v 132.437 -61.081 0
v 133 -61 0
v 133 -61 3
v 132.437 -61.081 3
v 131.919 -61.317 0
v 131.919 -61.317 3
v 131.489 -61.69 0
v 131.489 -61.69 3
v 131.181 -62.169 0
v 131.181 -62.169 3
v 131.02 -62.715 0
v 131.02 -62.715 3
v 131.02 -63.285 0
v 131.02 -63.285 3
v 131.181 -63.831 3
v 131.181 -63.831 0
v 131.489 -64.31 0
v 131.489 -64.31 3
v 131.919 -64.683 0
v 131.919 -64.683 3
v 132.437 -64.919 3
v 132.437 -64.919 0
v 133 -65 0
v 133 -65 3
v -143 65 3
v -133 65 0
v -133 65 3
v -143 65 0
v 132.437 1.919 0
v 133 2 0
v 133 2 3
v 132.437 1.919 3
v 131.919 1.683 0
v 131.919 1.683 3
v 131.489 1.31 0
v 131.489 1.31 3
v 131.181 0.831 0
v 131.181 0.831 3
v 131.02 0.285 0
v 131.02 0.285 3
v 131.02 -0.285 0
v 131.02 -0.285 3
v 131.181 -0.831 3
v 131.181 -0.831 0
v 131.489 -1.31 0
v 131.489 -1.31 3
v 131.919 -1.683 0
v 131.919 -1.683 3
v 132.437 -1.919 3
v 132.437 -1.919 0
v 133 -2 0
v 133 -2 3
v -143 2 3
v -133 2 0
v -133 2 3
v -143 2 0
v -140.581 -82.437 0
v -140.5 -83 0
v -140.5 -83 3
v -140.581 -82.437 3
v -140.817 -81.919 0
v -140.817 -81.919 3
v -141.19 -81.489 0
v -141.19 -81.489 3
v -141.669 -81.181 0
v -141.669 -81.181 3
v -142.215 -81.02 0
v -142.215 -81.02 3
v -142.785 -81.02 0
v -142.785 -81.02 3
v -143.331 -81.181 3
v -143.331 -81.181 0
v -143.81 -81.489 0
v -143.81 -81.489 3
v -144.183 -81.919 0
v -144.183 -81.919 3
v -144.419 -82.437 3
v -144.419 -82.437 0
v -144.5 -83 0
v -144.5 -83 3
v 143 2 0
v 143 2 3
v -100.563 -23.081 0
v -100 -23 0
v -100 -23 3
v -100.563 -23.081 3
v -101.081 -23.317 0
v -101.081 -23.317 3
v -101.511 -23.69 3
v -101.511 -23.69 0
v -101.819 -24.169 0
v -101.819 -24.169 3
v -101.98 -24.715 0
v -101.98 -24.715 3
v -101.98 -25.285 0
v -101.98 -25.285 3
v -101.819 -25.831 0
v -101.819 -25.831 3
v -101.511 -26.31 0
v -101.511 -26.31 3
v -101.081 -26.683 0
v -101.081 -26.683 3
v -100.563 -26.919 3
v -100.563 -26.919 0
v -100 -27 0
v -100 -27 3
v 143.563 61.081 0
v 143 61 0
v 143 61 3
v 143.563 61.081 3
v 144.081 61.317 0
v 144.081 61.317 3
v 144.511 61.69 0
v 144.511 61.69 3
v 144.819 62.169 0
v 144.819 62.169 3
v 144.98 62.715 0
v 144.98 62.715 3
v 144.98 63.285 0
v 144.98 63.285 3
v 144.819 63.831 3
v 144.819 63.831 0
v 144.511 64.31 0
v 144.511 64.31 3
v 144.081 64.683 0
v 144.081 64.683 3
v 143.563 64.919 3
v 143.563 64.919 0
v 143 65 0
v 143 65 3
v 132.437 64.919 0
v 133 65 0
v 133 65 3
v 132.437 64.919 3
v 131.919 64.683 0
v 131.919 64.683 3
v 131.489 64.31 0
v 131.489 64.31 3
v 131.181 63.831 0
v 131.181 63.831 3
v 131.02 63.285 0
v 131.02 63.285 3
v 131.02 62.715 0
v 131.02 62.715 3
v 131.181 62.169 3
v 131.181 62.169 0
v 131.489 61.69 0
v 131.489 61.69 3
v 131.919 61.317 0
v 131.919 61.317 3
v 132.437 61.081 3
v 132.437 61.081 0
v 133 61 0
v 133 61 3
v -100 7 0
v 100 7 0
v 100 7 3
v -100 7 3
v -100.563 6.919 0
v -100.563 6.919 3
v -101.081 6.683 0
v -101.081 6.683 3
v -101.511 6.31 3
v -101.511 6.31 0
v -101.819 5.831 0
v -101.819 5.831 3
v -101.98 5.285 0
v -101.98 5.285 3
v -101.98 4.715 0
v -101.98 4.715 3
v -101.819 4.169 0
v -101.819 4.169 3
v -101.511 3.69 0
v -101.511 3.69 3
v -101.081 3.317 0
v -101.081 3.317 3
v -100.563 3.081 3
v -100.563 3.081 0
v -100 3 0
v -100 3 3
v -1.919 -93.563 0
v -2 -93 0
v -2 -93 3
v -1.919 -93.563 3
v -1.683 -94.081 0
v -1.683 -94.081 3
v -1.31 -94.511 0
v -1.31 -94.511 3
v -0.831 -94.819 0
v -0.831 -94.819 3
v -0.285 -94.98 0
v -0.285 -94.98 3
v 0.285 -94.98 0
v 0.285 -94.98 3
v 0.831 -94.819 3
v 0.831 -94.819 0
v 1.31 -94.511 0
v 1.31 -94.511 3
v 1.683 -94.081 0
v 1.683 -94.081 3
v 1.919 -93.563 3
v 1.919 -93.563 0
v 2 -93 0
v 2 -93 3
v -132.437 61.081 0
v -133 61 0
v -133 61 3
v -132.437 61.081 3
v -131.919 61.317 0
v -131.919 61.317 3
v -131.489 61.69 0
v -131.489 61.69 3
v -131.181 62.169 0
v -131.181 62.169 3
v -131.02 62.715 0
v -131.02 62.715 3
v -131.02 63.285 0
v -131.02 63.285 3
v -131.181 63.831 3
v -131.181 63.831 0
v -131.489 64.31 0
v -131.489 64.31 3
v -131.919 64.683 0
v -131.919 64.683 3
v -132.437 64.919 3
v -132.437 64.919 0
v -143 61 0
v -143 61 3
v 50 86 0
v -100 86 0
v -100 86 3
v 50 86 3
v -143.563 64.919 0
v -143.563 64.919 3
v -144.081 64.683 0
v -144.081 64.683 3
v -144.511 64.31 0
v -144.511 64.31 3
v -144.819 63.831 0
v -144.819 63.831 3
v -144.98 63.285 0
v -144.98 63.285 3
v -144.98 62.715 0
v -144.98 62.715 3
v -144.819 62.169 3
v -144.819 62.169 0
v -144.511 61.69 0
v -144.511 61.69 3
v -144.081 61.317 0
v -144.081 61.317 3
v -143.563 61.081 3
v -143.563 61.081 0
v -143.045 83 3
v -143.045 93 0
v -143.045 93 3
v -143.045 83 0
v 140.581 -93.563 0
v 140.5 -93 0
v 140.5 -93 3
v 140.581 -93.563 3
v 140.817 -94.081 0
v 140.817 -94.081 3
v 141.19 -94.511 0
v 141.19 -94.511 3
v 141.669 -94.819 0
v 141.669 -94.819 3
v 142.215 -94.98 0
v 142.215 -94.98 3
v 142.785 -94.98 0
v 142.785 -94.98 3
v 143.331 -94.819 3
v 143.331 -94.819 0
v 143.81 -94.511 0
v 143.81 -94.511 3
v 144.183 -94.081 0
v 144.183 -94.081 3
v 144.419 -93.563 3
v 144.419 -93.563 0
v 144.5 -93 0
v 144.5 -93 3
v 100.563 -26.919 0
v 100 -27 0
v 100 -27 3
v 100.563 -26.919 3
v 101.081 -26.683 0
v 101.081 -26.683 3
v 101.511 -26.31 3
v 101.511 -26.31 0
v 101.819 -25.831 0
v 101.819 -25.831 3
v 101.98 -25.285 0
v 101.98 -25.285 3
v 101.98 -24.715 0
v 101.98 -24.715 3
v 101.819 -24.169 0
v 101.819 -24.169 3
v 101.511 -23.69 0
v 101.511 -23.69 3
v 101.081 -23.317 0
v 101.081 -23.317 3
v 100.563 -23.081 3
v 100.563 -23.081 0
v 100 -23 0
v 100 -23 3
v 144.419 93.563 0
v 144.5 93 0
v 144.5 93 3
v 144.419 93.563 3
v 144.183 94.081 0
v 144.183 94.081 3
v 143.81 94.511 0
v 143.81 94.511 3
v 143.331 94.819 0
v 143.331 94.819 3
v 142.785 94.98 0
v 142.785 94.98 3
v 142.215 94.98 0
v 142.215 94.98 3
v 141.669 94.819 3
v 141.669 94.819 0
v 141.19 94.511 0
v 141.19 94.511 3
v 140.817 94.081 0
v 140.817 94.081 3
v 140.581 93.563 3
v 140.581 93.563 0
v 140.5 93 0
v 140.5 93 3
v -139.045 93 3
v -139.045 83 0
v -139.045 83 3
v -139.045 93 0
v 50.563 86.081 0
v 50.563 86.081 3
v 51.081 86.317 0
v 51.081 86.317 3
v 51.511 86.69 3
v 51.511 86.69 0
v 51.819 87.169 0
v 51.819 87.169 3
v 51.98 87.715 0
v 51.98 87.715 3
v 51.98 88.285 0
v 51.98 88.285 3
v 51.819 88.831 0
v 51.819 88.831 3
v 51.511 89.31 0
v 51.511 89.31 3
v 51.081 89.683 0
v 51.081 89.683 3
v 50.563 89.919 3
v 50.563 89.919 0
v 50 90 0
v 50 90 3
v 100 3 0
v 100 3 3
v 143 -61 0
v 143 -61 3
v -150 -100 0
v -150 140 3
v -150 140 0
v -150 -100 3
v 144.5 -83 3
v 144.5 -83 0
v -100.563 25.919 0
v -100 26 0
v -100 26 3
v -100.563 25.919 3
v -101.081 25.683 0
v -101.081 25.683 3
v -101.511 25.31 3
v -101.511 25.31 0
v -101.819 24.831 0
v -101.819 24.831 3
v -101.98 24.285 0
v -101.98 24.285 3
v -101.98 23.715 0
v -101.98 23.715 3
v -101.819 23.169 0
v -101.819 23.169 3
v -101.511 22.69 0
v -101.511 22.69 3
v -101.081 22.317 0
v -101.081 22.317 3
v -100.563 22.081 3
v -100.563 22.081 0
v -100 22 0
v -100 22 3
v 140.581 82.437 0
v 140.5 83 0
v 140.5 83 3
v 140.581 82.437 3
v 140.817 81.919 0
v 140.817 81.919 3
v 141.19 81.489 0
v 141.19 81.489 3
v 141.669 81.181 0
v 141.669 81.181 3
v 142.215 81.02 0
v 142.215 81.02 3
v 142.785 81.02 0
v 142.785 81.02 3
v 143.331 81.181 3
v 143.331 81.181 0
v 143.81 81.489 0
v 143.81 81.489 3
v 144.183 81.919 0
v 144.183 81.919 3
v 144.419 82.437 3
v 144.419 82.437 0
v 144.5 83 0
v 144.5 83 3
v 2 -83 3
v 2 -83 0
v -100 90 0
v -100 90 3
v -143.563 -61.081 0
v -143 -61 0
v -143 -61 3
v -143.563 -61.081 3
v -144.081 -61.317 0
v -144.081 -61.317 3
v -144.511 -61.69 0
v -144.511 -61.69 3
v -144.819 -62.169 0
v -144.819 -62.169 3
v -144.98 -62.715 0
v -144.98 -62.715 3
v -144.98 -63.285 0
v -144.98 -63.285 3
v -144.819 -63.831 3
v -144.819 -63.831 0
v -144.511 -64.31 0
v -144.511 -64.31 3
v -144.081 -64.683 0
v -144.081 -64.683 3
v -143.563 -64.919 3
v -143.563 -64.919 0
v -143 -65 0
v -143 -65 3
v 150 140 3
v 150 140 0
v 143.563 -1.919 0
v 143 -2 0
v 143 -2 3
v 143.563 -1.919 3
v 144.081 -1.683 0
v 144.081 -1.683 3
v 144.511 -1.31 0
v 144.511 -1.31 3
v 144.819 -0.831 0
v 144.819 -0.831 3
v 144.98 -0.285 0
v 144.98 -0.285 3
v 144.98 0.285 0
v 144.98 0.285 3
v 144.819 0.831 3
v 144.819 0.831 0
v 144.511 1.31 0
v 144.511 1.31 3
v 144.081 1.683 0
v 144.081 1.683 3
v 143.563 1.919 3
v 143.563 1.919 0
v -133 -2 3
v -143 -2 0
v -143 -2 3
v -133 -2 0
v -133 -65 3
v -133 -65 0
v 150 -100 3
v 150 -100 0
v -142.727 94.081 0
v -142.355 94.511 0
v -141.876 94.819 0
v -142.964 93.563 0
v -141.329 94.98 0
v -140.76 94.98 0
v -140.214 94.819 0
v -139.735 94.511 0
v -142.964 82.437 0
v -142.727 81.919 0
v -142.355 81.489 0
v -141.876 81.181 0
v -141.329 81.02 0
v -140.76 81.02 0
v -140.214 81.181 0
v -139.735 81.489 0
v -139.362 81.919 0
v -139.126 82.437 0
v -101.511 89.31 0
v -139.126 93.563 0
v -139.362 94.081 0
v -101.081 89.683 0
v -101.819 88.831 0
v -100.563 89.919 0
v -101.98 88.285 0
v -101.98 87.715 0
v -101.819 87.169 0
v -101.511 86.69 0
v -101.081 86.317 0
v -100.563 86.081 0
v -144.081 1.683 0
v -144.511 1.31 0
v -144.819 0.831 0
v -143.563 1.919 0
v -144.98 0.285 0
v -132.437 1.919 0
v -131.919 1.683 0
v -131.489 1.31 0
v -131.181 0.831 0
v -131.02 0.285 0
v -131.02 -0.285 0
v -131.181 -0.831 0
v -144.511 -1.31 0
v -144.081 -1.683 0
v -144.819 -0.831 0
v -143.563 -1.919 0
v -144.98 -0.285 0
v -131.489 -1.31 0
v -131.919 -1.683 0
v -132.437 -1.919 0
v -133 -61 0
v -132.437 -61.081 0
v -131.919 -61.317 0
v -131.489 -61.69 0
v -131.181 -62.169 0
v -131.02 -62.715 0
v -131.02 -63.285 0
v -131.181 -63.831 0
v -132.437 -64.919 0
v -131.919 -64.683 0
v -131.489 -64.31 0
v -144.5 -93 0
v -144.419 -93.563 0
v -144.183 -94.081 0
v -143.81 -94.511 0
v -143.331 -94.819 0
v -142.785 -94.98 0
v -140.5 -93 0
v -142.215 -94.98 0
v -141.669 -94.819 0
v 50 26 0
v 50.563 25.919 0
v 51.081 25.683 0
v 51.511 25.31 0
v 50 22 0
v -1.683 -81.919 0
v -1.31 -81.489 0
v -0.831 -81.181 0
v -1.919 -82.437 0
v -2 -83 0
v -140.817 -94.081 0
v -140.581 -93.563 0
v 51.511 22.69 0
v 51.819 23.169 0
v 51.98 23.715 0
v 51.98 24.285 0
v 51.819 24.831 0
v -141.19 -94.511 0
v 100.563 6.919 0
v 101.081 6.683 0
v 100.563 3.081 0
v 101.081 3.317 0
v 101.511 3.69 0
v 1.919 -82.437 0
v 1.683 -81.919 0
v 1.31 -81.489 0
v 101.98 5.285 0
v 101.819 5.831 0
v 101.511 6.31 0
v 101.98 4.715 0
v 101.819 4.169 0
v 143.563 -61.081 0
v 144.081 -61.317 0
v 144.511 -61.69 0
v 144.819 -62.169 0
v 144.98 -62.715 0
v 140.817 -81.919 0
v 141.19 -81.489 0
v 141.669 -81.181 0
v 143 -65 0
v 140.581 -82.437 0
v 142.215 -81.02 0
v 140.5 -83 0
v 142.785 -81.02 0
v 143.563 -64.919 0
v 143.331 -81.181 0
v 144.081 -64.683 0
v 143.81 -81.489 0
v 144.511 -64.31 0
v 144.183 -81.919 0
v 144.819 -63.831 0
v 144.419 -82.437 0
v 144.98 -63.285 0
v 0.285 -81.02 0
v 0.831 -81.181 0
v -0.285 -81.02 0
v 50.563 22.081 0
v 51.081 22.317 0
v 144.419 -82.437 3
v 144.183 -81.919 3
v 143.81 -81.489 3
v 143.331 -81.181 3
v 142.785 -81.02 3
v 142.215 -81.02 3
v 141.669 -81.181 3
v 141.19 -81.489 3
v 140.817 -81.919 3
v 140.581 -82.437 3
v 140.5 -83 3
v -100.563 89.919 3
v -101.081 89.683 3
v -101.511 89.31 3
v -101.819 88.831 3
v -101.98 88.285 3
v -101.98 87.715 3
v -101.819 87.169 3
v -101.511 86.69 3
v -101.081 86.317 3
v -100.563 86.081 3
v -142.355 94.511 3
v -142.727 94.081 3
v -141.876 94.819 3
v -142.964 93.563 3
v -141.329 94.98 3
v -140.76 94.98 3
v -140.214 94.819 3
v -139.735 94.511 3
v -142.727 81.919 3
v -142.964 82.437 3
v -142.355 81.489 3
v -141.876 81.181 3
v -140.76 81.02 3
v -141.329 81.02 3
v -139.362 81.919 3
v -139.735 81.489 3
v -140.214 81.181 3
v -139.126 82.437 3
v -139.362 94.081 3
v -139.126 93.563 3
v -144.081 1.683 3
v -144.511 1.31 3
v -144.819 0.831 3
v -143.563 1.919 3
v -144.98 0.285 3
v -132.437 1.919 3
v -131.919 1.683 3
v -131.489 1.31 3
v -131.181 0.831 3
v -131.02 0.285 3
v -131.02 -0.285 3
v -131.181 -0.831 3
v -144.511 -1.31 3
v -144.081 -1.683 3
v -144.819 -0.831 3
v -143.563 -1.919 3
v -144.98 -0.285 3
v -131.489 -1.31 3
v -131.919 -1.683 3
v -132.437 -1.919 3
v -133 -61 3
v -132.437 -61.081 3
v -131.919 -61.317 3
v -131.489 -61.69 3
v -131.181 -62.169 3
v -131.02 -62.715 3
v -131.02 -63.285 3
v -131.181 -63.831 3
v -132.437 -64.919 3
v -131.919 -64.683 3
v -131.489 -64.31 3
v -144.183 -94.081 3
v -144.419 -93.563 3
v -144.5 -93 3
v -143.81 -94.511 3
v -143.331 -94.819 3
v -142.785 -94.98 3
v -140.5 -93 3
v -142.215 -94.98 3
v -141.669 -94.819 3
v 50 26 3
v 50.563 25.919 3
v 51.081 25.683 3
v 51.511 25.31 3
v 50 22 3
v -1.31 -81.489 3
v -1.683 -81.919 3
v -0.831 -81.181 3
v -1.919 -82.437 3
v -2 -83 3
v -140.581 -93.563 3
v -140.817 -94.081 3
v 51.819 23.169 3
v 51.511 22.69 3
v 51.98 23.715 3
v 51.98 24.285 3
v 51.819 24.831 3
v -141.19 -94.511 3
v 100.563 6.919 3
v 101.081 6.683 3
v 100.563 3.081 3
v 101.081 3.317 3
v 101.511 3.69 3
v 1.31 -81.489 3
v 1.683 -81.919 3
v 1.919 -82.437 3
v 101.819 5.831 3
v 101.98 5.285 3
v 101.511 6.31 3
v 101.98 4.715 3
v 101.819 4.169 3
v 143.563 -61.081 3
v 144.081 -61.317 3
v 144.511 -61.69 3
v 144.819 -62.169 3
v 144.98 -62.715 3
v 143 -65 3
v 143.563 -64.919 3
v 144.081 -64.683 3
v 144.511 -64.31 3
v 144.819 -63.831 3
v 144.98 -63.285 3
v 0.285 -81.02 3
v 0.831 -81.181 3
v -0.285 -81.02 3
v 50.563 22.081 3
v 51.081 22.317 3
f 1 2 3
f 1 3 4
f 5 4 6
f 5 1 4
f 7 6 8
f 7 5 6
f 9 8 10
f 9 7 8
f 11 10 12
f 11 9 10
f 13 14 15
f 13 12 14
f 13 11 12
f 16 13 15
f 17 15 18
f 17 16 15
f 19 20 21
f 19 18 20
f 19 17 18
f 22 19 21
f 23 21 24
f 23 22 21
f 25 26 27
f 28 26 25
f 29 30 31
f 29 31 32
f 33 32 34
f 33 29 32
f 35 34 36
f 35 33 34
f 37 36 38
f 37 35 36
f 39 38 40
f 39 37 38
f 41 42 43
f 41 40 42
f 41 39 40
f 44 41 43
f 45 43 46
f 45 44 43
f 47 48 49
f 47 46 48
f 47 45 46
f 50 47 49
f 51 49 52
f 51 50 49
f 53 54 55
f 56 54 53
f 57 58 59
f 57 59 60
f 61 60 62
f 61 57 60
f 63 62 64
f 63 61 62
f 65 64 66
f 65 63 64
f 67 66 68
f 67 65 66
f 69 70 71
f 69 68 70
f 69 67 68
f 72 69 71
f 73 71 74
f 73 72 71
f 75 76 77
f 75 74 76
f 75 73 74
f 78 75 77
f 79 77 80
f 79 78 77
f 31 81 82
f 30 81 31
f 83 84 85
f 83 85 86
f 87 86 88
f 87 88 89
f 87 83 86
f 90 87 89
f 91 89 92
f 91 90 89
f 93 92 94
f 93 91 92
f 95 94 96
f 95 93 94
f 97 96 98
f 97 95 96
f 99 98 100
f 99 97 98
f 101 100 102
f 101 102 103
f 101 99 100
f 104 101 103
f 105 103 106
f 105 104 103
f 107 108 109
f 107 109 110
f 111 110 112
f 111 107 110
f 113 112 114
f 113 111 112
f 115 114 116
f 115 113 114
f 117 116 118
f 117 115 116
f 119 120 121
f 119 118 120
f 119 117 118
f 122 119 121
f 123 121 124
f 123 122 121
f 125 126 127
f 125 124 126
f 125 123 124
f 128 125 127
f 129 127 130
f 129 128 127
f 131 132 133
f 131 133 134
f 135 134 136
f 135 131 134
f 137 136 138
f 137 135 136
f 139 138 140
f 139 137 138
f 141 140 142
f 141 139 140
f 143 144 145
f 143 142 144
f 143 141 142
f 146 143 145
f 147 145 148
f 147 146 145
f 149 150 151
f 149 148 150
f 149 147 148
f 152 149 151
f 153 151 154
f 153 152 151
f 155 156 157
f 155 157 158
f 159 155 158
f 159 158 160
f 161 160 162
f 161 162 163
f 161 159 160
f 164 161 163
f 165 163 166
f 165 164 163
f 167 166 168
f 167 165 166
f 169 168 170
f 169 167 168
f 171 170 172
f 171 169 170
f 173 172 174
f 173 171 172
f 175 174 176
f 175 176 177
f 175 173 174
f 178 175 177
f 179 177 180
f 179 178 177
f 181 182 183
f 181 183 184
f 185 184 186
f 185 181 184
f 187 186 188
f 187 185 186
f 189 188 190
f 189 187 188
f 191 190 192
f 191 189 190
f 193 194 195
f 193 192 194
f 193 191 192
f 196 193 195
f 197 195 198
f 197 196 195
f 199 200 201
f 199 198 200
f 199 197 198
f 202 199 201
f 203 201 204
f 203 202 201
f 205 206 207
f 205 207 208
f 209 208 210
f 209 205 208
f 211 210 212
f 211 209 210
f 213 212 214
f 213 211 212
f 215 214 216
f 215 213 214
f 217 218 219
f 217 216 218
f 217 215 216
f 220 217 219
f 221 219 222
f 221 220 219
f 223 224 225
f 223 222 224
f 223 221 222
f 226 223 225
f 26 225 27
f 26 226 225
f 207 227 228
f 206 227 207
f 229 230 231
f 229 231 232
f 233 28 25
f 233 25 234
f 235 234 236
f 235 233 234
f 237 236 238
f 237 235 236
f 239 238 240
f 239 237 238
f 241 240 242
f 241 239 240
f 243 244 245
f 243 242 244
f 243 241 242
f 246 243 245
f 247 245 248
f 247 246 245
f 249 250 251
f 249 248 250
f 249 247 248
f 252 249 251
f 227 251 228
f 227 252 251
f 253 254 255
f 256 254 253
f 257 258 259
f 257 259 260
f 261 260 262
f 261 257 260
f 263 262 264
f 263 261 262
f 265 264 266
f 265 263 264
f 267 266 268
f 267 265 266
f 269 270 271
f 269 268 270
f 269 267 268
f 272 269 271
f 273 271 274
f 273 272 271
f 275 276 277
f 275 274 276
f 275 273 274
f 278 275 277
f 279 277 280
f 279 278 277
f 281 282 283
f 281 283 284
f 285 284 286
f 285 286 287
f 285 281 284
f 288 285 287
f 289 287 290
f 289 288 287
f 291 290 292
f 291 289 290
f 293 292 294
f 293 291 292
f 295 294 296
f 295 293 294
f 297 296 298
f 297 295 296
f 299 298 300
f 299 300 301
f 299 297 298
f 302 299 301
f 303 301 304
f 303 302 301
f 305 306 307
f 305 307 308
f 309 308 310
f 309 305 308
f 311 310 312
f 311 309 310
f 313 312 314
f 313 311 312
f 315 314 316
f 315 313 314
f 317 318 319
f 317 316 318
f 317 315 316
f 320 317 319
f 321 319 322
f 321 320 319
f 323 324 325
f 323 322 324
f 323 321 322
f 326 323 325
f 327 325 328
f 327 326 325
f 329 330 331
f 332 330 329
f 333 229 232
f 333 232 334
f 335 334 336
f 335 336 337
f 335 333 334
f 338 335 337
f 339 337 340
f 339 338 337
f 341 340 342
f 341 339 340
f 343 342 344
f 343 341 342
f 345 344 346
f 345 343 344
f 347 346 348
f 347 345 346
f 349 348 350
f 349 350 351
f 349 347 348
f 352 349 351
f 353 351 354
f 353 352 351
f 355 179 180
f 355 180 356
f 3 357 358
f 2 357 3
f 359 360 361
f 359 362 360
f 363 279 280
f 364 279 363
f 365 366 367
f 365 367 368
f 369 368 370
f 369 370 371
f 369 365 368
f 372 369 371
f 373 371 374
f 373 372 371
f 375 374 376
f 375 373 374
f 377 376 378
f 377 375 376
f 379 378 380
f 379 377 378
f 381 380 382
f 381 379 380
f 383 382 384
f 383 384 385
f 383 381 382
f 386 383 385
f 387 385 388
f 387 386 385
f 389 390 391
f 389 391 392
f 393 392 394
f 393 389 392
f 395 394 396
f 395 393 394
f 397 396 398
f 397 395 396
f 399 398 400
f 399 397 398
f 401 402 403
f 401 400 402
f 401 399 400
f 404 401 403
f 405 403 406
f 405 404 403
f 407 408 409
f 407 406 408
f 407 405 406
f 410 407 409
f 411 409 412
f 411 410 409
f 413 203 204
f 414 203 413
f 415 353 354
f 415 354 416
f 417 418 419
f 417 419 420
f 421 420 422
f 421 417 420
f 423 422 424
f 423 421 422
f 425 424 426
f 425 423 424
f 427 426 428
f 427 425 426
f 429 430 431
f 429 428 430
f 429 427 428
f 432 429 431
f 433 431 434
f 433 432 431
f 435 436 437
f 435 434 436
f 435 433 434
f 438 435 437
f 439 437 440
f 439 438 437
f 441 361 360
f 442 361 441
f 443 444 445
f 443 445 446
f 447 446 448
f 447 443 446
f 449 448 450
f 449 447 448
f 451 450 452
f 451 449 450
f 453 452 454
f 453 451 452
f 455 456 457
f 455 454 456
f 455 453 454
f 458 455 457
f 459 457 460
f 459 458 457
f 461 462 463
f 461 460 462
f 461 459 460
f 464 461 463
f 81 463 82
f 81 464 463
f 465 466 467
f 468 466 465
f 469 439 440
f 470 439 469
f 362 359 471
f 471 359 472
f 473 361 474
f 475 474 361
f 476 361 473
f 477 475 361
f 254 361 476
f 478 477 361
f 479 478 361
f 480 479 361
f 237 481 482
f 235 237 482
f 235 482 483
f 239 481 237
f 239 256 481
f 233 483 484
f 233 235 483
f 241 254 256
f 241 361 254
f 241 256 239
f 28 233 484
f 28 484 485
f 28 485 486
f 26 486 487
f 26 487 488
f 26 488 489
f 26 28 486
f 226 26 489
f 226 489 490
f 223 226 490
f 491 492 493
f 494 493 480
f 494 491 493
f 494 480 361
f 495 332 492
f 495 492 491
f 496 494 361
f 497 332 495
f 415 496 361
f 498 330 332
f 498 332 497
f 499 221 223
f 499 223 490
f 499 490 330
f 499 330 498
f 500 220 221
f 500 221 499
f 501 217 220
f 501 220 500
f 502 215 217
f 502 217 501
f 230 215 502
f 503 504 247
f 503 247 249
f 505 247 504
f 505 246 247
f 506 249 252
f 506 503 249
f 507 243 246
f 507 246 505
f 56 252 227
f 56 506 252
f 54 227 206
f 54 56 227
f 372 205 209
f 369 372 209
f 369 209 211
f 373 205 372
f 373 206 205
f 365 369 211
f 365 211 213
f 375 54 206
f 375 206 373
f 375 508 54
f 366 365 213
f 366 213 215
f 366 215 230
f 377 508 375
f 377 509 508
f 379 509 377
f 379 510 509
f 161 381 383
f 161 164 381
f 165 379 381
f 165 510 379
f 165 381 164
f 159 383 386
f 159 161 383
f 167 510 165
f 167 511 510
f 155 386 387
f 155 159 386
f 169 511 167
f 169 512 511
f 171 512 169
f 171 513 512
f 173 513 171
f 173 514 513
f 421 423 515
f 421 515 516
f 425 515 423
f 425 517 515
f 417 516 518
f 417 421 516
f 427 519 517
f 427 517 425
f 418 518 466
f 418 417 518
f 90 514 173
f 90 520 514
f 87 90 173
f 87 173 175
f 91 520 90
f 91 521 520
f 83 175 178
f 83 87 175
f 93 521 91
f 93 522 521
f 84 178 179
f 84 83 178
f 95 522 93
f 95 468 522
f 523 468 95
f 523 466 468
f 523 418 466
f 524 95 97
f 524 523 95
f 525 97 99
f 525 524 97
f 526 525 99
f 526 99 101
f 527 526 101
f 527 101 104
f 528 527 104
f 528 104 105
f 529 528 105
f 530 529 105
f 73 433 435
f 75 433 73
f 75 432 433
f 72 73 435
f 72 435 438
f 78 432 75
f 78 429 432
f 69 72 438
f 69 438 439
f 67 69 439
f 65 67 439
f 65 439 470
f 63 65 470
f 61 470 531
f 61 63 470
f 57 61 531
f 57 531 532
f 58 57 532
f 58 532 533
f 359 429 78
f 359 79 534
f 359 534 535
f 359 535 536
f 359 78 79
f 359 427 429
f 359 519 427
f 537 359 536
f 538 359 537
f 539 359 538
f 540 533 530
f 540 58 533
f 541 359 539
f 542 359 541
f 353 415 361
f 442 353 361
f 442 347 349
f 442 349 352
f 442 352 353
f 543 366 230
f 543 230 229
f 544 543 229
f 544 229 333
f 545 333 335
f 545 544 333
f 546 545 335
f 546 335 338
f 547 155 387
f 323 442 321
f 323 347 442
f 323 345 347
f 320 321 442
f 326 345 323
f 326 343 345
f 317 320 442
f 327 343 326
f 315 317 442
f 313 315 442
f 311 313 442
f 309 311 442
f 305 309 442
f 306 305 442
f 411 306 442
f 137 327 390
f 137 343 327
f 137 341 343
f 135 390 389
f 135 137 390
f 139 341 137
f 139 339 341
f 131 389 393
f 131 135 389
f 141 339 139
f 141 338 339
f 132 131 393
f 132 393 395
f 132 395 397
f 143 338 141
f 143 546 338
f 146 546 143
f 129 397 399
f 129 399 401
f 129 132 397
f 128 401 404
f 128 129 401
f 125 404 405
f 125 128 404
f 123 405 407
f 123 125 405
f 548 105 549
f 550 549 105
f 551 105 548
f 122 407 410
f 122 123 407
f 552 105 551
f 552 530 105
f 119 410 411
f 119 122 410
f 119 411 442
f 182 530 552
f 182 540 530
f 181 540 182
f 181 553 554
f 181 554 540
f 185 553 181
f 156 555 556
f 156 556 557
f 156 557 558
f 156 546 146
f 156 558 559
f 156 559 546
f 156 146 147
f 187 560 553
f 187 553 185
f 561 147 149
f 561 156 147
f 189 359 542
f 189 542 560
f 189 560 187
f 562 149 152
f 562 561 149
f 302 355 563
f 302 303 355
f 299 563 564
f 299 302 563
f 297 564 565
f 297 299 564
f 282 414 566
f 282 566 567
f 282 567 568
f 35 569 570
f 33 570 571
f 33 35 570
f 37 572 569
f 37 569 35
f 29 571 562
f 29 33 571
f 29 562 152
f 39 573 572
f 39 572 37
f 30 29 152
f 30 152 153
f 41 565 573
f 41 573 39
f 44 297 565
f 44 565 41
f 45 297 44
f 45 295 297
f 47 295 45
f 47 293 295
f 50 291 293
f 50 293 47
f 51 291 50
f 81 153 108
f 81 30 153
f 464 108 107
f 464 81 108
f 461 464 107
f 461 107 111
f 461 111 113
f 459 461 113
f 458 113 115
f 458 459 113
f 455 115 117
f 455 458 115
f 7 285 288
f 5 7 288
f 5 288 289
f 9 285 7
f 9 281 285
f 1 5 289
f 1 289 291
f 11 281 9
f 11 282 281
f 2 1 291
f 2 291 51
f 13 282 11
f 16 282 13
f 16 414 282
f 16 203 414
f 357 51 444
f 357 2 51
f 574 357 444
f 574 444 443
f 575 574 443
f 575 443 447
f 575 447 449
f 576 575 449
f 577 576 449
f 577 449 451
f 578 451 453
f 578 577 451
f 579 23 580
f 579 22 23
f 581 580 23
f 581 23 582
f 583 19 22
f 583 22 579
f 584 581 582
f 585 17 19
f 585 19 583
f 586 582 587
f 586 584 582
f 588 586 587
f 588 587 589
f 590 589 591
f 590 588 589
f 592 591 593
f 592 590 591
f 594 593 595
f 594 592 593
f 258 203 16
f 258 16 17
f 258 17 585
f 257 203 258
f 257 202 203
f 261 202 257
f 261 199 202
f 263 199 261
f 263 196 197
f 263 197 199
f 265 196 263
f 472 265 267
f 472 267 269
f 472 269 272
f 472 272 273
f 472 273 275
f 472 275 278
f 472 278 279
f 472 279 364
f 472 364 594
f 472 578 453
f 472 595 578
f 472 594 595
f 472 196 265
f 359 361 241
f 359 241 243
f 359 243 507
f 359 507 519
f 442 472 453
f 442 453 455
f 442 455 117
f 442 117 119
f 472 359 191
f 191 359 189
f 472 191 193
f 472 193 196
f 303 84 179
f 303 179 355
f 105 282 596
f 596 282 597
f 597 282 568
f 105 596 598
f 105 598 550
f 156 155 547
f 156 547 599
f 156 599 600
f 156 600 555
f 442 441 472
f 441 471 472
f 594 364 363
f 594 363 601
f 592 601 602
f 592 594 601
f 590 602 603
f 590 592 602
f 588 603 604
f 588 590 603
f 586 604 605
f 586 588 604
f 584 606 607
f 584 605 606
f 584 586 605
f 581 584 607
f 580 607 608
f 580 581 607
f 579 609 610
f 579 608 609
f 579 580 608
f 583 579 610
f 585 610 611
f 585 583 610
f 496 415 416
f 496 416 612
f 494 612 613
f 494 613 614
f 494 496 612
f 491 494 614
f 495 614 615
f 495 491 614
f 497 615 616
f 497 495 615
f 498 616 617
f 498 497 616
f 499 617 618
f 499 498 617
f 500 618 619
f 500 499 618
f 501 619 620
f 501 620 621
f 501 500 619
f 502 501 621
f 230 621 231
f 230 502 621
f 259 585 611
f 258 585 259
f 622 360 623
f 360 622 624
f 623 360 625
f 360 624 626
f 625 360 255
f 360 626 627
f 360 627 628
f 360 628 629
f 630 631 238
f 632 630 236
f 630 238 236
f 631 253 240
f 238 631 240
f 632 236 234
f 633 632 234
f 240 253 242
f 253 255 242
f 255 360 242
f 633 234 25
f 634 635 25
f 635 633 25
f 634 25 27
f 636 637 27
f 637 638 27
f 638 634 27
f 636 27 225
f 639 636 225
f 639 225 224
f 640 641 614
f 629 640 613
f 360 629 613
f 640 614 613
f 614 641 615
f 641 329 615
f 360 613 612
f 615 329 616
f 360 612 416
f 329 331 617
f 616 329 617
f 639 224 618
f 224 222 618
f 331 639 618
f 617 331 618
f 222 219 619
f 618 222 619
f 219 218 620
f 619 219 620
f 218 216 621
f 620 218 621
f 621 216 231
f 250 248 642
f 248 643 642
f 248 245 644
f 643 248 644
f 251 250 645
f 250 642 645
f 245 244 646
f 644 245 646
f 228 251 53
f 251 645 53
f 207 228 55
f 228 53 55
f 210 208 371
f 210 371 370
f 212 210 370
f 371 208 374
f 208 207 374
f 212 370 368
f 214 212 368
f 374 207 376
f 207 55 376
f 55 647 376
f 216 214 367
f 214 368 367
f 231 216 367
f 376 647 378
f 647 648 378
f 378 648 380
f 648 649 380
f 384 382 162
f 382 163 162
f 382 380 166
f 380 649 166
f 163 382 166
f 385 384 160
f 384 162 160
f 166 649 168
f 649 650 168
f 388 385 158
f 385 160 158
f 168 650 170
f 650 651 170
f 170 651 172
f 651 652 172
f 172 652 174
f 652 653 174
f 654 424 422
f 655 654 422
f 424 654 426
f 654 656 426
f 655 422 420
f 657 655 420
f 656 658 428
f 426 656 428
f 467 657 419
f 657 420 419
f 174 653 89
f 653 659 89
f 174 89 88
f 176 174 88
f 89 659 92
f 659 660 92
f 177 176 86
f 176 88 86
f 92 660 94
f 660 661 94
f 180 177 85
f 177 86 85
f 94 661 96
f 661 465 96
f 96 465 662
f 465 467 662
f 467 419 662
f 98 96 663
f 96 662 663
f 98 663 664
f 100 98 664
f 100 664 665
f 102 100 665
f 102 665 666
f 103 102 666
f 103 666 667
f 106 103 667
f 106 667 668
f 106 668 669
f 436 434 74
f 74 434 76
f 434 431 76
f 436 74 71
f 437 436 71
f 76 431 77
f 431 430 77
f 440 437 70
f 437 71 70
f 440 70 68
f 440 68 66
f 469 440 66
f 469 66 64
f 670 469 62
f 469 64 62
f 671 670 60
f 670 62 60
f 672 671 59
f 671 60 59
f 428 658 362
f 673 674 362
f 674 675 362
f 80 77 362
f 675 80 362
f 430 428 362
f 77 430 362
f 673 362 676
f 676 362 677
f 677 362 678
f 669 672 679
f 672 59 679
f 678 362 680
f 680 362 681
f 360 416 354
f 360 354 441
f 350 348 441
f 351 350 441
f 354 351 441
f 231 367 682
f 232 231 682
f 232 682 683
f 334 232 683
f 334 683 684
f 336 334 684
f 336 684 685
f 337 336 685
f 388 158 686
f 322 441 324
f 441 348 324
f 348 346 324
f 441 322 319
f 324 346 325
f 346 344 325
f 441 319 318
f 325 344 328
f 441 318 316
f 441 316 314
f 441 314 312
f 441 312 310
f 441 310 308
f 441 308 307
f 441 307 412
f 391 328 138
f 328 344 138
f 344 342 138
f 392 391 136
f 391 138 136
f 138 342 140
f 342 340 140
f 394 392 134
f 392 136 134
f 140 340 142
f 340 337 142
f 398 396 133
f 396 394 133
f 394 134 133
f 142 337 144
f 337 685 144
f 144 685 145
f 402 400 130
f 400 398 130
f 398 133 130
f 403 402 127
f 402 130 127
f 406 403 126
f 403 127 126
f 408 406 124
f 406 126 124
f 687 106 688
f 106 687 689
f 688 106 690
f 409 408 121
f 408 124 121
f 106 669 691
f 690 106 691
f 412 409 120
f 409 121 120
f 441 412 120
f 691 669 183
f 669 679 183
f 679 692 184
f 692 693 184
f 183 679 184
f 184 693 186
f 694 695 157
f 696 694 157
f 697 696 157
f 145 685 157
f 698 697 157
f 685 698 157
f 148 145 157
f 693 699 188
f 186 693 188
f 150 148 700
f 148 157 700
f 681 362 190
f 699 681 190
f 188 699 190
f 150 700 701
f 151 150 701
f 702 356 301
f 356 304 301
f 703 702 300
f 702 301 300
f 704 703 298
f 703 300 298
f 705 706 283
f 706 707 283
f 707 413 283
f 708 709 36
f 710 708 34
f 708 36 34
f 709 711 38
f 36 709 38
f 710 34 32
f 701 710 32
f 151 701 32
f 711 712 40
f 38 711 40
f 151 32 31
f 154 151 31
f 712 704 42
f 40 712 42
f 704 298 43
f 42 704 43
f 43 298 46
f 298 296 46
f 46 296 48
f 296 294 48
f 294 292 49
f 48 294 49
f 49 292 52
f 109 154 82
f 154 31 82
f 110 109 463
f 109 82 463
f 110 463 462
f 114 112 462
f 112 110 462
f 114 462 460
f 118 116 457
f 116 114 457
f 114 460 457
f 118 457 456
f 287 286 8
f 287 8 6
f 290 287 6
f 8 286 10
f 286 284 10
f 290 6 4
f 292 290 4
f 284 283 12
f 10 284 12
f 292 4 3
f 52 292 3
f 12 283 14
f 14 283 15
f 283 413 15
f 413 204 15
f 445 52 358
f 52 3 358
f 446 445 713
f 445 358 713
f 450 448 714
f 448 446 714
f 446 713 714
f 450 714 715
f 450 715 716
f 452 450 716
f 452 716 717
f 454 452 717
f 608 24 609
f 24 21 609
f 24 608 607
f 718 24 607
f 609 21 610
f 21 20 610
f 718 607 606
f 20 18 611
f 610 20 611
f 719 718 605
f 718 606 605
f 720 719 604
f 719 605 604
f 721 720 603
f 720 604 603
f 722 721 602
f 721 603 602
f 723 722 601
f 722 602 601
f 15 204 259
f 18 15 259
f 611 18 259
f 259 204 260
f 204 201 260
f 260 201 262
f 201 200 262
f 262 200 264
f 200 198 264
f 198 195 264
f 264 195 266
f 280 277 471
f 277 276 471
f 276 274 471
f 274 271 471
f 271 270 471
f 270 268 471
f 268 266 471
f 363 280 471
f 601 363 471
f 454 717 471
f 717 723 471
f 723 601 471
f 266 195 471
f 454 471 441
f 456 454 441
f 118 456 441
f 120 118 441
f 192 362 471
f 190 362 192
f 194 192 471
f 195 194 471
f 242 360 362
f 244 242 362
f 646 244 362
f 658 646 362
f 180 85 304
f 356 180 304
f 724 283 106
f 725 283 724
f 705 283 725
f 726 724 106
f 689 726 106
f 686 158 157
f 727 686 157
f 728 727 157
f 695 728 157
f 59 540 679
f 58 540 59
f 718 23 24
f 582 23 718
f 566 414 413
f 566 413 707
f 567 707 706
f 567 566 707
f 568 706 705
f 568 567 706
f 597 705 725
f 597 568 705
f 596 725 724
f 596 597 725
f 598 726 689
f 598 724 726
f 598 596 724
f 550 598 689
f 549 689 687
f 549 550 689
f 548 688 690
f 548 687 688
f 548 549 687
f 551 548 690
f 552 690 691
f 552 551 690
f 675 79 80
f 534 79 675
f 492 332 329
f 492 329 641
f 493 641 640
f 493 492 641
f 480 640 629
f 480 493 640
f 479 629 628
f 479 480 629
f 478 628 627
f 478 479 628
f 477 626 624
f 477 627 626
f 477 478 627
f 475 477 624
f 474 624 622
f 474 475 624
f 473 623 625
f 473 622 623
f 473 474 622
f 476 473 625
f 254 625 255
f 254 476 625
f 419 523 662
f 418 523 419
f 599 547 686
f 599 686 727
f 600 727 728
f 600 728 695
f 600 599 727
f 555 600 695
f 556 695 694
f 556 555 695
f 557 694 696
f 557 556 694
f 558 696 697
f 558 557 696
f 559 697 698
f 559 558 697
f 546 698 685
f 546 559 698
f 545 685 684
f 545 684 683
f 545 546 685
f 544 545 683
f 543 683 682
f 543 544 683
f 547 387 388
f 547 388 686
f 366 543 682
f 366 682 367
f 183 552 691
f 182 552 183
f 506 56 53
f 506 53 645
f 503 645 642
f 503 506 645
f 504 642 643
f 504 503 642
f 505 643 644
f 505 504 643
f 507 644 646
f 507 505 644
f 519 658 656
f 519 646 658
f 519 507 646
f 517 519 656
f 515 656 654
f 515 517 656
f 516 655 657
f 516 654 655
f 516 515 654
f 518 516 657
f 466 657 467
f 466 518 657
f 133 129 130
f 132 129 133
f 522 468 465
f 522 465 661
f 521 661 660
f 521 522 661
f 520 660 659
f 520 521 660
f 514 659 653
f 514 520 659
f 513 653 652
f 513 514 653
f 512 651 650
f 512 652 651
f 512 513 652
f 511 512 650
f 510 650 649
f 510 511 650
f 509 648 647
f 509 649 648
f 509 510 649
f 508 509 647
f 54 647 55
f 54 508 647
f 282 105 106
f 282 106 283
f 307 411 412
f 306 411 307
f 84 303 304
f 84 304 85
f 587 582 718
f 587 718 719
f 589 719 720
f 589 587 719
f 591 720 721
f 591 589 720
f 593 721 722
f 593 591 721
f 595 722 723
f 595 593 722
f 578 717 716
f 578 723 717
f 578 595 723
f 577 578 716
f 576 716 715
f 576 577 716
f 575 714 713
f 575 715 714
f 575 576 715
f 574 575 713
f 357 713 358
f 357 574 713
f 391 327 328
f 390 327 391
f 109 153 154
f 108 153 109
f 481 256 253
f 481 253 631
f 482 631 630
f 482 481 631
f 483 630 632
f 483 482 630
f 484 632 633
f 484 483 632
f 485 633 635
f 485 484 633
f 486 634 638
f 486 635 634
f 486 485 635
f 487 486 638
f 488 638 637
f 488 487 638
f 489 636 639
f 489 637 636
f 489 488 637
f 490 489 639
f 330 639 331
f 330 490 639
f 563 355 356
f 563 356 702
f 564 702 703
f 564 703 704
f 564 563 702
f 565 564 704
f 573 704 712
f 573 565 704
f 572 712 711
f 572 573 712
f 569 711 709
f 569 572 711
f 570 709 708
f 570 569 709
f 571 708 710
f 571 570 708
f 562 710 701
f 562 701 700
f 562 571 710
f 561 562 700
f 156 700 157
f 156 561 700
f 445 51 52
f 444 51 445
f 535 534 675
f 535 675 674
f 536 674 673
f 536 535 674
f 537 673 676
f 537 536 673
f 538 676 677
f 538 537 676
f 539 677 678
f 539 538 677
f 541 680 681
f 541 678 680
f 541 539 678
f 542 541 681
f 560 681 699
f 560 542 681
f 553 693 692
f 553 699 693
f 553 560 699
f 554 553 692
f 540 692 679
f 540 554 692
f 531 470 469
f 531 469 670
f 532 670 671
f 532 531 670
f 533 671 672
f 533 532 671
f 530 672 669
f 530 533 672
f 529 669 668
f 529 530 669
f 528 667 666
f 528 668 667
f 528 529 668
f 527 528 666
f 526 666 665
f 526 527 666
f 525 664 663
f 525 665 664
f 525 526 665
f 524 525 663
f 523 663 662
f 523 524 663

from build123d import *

# Parameters (mm, degrees)
SKETCH1_W           = 300
SKETCH1_H           = 200
BOSS_EXTRUDE1_DEPTH = 3
CUT_EXTRUDE1_DEPTH  = 3
CUT_EXTRUDE2_DEPTH  = 10
CUT_EXTRUDE3_DEPTH  = 10
CUT_EXTRUDE4_DEPTH  = 10
CUT_EXTRUDE5_DEPTH  = 10
CUT_EXTRUDE6_DEPTH  = 10
CUT_EXTRUDE7_DEPTH  = 10
CUT_EXTRUDE8_DEPTH  = 10
SKETCH10_W          = 300
SKETCH10_H          = 3
BOSS_EXTRUDE2_DEPTH = 40


with BuildPart() as part:
    # Sketch1 → Boss-Extrude1 (new body)
    with BuildSketch(Plane.XY):
        Rectangle(SKETCH1_W, SKETCH1_H)
    extrude(amount=BOSS_EXTRUDE1_DEPTH)

    # Sketch2 → Cut-Extrude1 (cut)
    with BuildSketch(Plane(origin=(0, 0, 0), x_dir=(-1, 0, 0), z_dir=(0, 0, -1))):
        with BuildLine():
            Line((-100, -23), (100, -23))
            ThreePointArc((100, -23), (102, -25), (100, -27))
            Line((100, -27), (-100, -27))
            ThreePointArc((-100, -27), (-102, -25), (-100, -23))
        make_face()
        with BuildLine():
            Line((-100, 7), (100, 7))
            ThreePointArc((100, 7), (102, 5), (100, 3))
            Line((100, 3), (-100, 3))
            ThreePointArc((-100, 3), (-102, 5), (-100, 7))
        make_face()
        with BuildLine():
            Line((-50, 26), (100, 26))
            ThreePointArc((100, 26), (102, 24), (100, 22))
            Line((100, 22), (-50, 22))
            ThreePointArc((-50, 22), (-52, 24), (-50, 26))
        make_face()
        with BuildLine():
            Line((-50, 90), (100, 90))
            ThreePointArc((100, 90), (102, 88), (100, 86))
            Line((100, 86), (-50, 86))
            ThreePointArc((-50, 86), (-52, 88), (-50, 90))
        make_face()
    extrude(amount=-CUT_EXTRUDE1_DEPTH, mode=Mode.SUBTRACT)

    # Sketch3 → Cut-Extrude2 (cut)
    with BuildSketch(Plane(origin=(0, 0, 0), x_dir=(-1, 0, 0), z_dir=(0, 0, -1))):
        with BuildLine():
            Line((143.044786866, 93), (143.044786866, 83))
            ThreePointArc((143.044786866, 83), (141.044786866, 81), (139.044786866, 83))
            Line((139.044786866, 83), (139.044786866, 93))
            ThreePointArc((139.044786866, 93), (141.044786866, 95), (143.044786866, 93))
        make_face()
    extrude(amount=-CUT_EXTRUDE2_DEPTH, mode=Mode.SUBTRACT)

    # Sketch4 → Cut-Extrude3 (cut)
    with BuildSketch(Plane(origin=(0, 0, 0), x_dir=(-1, 0, 0), z_dir=(0, 0, -1))):
        with BuildLine():
            Line((144.5, -83), (144.5, -93))
            ThreePointArc((144.5, -93), (142.5, -95), (140.5, -93))
            Line((140.5, -93), (140.5, -83))
            ThreePointArc((140.5, -83), (142.5, -81), (144.5, -83))
        make_face()
    extrude(amount=-CUT_EXTRUDE3_DEPTH, mode=Mode.SUBTRACT)

    # Sketch5 → Cut-Extrude4 (cut)
    with BuildSketch(Plane(origin=(0, 0, 0), x_dir=(-1, 0, 0), z_dir=(0, 0, -1))):
        with BuildLine():
            Line((-140.5, 93), (-140.5, 83))
            ThreePointArc((-140.5, 83), (-142.5, 81), (-144.5, 83))
            Line((-144.5, 83), (-144.5, 93))
            ThreePointArc((-144.5, 93), (-142.5, 95), (-140.5, 93))
        make_face()
    extrude(amount=-CUT_EXTRUDE4_DEPTH, mode=Mode.SUBTRACT)

    # Sketch6 → Cut-Extrude5 (cut)
    with BuildSketch(Plane(origin=(0, 0, 0), x_dir=(-1, 0, 0), z_dir=(0, 0, -1))):
        with BuildLine():
            Line((-140.5, -83), (-140.5, -93))
            ThreePointArc((-140.5, -93), (-142.5, -95), (-144.5, -93))
            Line((-144.5, -93), (-144.5, -83))
            ThreePointArc((-144.5, -83), (-142.5, -81), (-140.5, -83))
        make_face()
    extrude(amount=-CUT_EXTRUDE5_DEPTH, mode=Mode.SUBTRACT)

    # Sketch7 → Cut-Extrude6 (cut)
    with BuildSketch(Plane(origin=(0, 0, 0), x_dir=(-1, 0, 0), z_dir=(0, 0, -1))):
        with BuildLine():
            Line((2, -83), (2, -93))
            ThreePointArc((2, -93), (0, -95), (-2, -93))
            Line((-2, -93), (-2, -83))
            ThreePointArc((-2, -83), (0, -81), (2, -83))
        make_face()
    extrude(amount=-CUT_EXTRUDE6_DEPTH, mode=Mode.SUBTRACT)

    # Sketch8 → Cut-Extrude7 (cut)
    with BuildSketch(Plane(origin=(0, 0, 0), x_dir=(-1, 0, 0), z_dir=(0, 0, -1))):
        with BuildLine():
            Line((-143, 65), (-133, 65))
            ThreePointArc((-133, 65), (-131, 63), (-133, 61))
            Line((-133, 61), (-143, 61))
            ThreePointArc((-143, 61), (-145, 63), (-143, 65))
        make_face()
        with BuildLine():
            Line((-143, -61), (-133, -61))
            ThreePointArc((-133, -61), (-131, -63), (-133, -65))
            Line((-133, -65), (-143, -65))
            ThreePointArc((-143, -65), (-145, -63), (-143, -61))
        make_face()
        with BuildLine():
            Line((-143, 2), (-133, 2))
            ThreePointArc((-133, 2), (-131, 0), (-133, -2))
            Line((-133, -2), (-143, -2))
            ThreePointArc((-143, -2), (-145, 0), (-143, 2))
        make_face()
    extrude(amount=-CUT_EXTRUDE7_DEPTH, mode=Mode.SUBTRACT)

    # Sketch9 → Cut-Extrude8 (cut)
    with BuildSketch(Plane(origin=(0, 0, 0), x_dir=(-1, 0, 0), z_dir=(0, 0, -1))):
        with BuildLine():
            Line((133, 65), (143, 65))
            ThreePointArc((143, 65), (145, 63), (143, 61))
            Line((143, 61), (133, 61))
            ThreePointArc((133, 61), (131, 63), (133, 65))
        make_face()
        with BuildLine():
            Line((133, 2), (143, 2))
            ThreePointArc((143, 2), (145, 0), (143, -2))
            Line((143, -2), (133, -2))
            ThreePointArc((133, -2), (131, 0), (133, 2))
        make_face()
        with BuildLine():
            Line((133, -61), (143, -61))
            ThreePointArc((143, -61), (145, -63), (143, -65))
            Line((143, -65), (133, -65))
            ThreePointArc((133, -65), (131, -63), (133, -61))
        make_face()
    extrude(amount=-CUT_EXTRUDE8_DEPTH, mode=Mode.SUBTRACT)

    # Sketch10 → Boss-Extrude2 (add)
    with BuildSketch(Plane(origin=(0, 100, 0), x_dir=(1, 0, 0), z_dir=(0, 1, 0))):
        with Locations((0, -1.5)):
            Rectangle(SKETCH10_W, SKETCH10_H)
    extrude(amount=BOSS_EXTRUDE2_DEPTH)


solid = part.part
